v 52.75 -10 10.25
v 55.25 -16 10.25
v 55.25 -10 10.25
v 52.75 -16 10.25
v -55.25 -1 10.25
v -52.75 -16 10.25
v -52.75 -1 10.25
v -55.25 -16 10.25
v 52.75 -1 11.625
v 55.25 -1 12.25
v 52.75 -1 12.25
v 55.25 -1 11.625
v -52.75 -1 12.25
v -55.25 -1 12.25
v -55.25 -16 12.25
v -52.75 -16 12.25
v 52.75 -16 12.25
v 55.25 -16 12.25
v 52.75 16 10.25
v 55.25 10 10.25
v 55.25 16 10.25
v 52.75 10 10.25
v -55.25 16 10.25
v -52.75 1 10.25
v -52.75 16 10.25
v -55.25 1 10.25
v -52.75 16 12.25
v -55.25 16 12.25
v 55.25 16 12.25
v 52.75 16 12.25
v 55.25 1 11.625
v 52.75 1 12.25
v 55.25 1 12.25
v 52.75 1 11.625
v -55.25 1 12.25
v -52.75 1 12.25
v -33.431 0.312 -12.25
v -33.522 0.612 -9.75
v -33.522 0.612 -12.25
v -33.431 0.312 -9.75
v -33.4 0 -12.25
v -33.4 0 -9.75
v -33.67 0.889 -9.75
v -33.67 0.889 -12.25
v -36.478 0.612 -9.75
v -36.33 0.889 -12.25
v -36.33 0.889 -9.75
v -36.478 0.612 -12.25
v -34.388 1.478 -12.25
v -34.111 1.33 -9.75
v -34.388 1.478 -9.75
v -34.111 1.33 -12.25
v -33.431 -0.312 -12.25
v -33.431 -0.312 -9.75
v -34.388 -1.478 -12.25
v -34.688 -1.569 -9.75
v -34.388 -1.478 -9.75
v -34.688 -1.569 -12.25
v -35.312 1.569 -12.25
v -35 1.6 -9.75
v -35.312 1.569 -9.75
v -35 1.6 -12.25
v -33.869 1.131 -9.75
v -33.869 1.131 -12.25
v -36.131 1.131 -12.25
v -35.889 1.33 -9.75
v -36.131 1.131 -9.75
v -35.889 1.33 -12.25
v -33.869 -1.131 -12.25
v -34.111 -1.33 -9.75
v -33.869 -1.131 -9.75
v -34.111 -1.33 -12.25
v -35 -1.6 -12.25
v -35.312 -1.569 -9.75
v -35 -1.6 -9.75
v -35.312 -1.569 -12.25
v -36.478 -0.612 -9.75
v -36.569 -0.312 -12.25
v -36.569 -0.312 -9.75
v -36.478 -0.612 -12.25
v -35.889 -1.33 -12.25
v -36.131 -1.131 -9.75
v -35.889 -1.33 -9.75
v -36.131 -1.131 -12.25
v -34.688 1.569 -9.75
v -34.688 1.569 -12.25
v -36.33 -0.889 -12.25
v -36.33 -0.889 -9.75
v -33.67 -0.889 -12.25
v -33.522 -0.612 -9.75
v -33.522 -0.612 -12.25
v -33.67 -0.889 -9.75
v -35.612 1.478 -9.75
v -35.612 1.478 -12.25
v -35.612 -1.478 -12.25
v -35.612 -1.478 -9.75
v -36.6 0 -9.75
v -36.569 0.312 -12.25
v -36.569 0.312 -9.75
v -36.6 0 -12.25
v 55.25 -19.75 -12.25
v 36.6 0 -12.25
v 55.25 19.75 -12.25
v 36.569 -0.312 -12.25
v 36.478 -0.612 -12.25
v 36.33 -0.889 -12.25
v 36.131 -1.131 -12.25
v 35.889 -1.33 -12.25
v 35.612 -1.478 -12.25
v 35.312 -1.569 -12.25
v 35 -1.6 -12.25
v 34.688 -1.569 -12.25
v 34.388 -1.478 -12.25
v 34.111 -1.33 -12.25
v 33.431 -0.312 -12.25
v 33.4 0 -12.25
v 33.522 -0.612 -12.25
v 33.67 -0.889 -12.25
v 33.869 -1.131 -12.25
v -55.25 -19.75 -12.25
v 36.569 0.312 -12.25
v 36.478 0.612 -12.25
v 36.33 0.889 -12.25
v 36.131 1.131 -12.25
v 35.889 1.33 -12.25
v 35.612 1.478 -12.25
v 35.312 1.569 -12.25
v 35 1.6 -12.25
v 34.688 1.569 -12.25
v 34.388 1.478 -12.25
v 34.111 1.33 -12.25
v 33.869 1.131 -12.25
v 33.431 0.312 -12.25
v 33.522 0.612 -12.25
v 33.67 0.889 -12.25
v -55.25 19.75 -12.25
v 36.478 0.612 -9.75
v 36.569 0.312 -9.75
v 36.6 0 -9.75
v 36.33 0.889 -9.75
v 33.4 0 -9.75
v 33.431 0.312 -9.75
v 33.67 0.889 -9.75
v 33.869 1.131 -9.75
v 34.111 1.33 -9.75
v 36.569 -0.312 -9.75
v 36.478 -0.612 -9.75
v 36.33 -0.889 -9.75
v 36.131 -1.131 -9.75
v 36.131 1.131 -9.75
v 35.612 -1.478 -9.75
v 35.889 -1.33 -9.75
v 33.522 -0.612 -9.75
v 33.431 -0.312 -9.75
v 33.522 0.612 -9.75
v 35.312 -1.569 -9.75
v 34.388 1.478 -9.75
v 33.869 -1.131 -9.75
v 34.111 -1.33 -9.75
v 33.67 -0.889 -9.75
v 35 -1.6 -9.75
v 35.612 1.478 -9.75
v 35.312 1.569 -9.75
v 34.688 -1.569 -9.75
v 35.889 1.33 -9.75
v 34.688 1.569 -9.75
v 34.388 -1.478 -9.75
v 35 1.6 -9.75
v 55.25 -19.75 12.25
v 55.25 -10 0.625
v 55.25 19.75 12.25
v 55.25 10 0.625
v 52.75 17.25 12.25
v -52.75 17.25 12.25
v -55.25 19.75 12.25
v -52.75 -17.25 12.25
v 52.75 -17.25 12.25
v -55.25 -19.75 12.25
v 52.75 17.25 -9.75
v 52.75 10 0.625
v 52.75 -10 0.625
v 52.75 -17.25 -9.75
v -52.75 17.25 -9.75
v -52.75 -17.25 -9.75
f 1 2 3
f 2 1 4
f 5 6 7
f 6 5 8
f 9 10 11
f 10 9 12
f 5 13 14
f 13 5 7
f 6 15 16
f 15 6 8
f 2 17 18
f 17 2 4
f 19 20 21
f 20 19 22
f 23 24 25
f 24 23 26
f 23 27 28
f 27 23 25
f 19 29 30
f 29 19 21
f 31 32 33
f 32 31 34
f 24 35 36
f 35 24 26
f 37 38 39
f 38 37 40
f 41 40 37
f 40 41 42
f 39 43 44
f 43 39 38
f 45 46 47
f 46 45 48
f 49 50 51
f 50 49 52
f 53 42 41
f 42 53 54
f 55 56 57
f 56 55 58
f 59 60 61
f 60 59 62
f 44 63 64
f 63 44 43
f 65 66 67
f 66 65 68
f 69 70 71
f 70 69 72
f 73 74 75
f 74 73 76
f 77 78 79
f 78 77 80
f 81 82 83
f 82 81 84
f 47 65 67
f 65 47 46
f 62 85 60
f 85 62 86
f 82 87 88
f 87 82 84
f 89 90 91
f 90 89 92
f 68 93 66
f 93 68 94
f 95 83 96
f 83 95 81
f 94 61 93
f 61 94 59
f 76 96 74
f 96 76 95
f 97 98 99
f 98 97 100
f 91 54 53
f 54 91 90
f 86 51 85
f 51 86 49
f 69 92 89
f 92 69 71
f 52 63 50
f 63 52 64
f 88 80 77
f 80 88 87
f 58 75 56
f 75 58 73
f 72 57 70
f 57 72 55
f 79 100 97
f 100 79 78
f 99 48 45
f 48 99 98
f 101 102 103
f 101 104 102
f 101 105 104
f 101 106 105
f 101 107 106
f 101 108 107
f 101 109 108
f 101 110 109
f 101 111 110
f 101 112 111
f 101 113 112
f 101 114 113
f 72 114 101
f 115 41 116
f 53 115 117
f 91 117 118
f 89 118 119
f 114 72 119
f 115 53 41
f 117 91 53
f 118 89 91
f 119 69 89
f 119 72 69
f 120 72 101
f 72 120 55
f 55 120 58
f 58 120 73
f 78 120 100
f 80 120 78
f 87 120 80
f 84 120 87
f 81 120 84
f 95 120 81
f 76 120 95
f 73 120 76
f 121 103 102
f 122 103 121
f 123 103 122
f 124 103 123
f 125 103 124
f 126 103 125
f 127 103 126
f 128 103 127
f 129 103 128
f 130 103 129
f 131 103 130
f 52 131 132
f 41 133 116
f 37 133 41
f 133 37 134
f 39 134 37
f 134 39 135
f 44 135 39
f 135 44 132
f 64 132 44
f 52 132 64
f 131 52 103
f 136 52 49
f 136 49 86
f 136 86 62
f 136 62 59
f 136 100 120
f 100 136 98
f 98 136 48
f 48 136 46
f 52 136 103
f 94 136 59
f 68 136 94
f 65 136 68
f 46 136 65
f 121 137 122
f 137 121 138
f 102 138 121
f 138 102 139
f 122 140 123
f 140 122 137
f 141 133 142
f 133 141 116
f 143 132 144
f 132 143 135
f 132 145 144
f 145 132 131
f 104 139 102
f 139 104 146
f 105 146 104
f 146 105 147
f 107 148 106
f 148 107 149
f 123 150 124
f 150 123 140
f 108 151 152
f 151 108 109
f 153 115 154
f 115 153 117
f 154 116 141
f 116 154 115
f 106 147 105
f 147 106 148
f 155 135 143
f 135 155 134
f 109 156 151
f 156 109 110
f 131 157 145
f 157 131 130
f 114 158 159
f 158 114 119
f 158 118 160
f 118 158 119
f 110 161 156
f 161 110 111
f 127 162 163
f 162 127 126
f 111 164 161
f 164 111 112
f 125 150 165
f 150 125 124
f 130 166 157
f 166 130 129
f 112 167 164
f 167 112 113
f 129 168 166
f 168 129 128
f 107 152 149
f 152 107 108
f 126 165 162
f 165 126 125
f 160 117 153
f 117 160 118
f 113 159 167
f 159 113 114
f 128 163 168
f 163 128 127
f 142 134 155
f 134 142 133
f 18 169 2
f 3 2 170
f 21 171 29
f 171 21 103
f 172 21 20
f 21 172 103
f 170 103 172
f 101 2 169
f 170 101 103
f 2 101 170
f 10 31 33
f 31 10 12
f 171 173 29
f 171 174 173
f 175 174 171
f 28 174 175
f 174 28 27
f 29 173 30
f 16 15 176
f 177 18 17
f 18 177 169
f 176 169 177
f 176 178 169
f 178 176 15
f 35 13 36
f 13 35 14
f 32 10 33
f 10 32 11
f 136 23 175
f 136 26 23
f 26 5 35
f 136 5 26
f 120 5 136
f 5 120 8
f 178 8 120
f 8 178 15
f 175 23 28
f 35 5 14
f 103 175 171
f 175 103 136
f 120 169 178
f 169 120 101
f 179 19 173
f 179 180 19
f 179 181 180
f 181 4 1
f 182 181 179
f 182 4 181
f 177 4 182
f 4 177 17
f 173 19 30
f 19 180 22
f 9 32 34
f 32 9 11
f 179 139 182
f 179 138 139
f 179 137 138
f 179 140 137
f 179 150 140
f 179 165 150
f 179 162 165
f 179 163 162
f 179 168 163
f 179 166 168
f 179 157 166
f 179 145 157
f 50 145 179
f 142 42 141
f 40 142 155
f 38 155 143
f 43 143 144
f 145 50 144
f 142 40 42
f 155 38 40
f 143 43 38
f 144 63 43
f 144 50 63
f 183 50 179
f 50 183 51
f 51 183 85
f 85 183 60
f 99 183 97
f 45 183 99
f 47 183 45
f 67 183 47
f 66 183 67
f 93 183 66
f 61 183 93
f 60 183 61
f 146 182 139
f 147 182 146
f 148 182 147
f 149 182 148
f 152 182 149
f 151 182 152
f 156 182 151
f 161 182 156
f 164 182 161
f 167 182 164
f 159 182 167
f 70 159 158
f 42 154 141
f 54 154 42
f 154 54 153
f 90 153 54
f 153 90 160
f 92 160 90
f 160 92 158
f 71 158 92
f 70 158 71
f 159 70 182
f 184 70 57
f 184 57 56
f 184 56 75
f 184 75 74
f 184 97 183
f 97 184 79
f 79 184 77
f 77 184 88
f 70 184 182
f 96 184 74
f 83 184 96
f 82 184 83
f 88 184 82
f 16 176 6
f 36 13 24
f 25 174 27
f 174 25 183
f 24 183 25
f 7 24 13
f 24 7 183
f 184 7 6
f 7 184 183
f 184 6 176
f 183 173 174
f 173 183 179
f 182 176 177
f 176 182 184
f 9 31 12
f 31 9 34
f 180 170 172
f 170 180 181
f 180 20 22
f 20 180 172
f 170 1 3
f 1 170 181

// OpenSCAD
// Self-Balancing Cube — Battery Bay
// Fits: 3S 1300mAh LiPo (~105 x 34 x 22mm)
// Velcro strap slots on both sides
// Print: PETG, 40% infill

$fn = 32;

lipo_l  = 105.0;
lipo_w  = 34.0;
lipo_h  = 22.0;
wall    = 2.5;
strap_w = 15;
strap_t = 2;
tol     = 0.5;   // clearance

inner_l = lipo_l + tol;
inner_w = lipo_w + tol;
outer_l = inner_l + 2*wall;
outer_w = inner_w + 2*wall;
outer_h = lipo_h + wall;

difference() {
    // Outer shell (3 sides + bottom, top open)
    cube([outer_l, outer_w, outer_h], center=true);

    // Inner cavity
    translate([0, 0, wall])
        cube([inner_l, inner_w, outer_h], center=true);

    // Wire exit slot (front)
    translate([outer_l/2, 0, outer_h/4])
        cube([wall*2 + 1, 20, lipo_h/2], center=true);

    // Velcro strap slots (top, both sides)
    for (y = [-lipo_w/4, lipo_w/4]) {
        translate([0, y, outer_h/2])
            cube([outer_l + 1, strap_w, strap_t*2], center=true);
    }

    // Mounting holes (bottom, M3)
    for (x = [-lipo_l/3, lipo_l/3]) {
        translate([x, 0, -outer_h/2])
            cylinder(h=wall + 1, d=3.2);
    }
}
